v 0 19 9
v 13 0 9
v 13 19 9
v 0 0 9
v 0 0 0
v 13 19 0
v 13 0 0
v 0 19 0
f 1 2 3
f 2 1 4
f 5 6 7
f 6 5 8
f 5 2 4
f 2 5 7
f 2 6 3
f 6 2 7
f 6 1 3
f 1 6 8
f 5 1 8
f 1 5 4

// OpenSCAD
// Generated by SolidPython 1.0.1 on 2020-07-29 00:46:55


cube(size = [13, 19, 9]);
/***********************************************
*********      SolidPython code:      **********
************************************************
 
# import packages: SolidPython
from solid import *
from solid.utils import *
from itertools import chain, combinations, permutations


class Resize:

    def __init__(self, scad_file):
        self.scad_file = scad_file
        #self.scad_file = import_scad(scad_file)
        # cone/cylinder param:
        self.r1 = 0
        self.r2 = 0
        self.h = 0
        # rectangular prism param:
        self.w = 0
        self.l = 0
        # ellipse param:
        self.r = 0

    # import OpenScad code (file name corresponds to shape)


    # classify shape + parameters
    def assign(self, param1, param2, param3):
        if self.scad_file == 'cone.scad':
            self.r1 = param1
            self.r2 = param2
            self.h = param3
        elif self.scad_file == 'cylinder.scad':
            self.r1 = param1
            self.r2 = param2
            self.h = param3
        elif self.scad_file == 'rectangularPrism.scad':
            self.h = param1
            self.l = param2
            self.w = param3
        else:
            self.r = param1
            self.h = param2

    # resize parameters
    def iterate(self):
        x = range(3, 20, 2)
        i = 1
        if self.scad_file == 'cone.scad':
            tempList = list(permutations(x, 2))
            for temp in tempList:
                param1 = temp[0]
                param2 = temp[1]
                filepath = 'produced_scad_files/' + 'cone' + str(param1) + '_' + str(param2) + '_' + '.scad'
                scad_render_to_file(cylinder(h=param1, r1=param2, r2=0), filepath)

        elif self.scad_file == 'cylinder.scad':
            tempList = list(permutations(x, 3))
            for temp in tempList:
                param1 = temp[0]
                param2 = temp[1]
                filepath = 'produced_scad_files/' + 'cylinder' + str(param1) + '_' + str(param2) + '_' + '.scad'
                scad_render_to_file(cylinder(h=param1, r1=param2, r2=param2), filepath)

        elif self.scad_file == 'rectangularPrism.scad':
            tempList = list(permutations(x, 3))
            for temp in tempList:
                param1 = temp[0]
                param2 = temp[1]
                param3 = temp[2]
                filepath = 'produced_scad_files/' + 'rectangularPrism' + str(param1) + '_' + str(param2) + '_' + str(
                    param3) + '.scad'
                scad_render_to_file(cube(size=(param1, param2, param3)), filepath)

        elif self.scad_file == 'ellipse.scad':
            tempList = list(permutations(x, 4))
            for temp in tempList:
                param1 = temp[0]
                param2 = temp[1]
                param3 = temp[2]
                param4 = temp[3]
                filepath = 'produced_scad_files/' + 'ellipse' + str(param1) + '_' + str(param2) + '_' + str(param3) + '_' + str(param4) + '.scad'
                scad_render_to_file(scale([param1, param2, param3])(sphere(r=param4)), filepath)

    def render_to_scadfile(self):
        scad_render_to_file(scad, 'example.scad') 
 
************************************************/
